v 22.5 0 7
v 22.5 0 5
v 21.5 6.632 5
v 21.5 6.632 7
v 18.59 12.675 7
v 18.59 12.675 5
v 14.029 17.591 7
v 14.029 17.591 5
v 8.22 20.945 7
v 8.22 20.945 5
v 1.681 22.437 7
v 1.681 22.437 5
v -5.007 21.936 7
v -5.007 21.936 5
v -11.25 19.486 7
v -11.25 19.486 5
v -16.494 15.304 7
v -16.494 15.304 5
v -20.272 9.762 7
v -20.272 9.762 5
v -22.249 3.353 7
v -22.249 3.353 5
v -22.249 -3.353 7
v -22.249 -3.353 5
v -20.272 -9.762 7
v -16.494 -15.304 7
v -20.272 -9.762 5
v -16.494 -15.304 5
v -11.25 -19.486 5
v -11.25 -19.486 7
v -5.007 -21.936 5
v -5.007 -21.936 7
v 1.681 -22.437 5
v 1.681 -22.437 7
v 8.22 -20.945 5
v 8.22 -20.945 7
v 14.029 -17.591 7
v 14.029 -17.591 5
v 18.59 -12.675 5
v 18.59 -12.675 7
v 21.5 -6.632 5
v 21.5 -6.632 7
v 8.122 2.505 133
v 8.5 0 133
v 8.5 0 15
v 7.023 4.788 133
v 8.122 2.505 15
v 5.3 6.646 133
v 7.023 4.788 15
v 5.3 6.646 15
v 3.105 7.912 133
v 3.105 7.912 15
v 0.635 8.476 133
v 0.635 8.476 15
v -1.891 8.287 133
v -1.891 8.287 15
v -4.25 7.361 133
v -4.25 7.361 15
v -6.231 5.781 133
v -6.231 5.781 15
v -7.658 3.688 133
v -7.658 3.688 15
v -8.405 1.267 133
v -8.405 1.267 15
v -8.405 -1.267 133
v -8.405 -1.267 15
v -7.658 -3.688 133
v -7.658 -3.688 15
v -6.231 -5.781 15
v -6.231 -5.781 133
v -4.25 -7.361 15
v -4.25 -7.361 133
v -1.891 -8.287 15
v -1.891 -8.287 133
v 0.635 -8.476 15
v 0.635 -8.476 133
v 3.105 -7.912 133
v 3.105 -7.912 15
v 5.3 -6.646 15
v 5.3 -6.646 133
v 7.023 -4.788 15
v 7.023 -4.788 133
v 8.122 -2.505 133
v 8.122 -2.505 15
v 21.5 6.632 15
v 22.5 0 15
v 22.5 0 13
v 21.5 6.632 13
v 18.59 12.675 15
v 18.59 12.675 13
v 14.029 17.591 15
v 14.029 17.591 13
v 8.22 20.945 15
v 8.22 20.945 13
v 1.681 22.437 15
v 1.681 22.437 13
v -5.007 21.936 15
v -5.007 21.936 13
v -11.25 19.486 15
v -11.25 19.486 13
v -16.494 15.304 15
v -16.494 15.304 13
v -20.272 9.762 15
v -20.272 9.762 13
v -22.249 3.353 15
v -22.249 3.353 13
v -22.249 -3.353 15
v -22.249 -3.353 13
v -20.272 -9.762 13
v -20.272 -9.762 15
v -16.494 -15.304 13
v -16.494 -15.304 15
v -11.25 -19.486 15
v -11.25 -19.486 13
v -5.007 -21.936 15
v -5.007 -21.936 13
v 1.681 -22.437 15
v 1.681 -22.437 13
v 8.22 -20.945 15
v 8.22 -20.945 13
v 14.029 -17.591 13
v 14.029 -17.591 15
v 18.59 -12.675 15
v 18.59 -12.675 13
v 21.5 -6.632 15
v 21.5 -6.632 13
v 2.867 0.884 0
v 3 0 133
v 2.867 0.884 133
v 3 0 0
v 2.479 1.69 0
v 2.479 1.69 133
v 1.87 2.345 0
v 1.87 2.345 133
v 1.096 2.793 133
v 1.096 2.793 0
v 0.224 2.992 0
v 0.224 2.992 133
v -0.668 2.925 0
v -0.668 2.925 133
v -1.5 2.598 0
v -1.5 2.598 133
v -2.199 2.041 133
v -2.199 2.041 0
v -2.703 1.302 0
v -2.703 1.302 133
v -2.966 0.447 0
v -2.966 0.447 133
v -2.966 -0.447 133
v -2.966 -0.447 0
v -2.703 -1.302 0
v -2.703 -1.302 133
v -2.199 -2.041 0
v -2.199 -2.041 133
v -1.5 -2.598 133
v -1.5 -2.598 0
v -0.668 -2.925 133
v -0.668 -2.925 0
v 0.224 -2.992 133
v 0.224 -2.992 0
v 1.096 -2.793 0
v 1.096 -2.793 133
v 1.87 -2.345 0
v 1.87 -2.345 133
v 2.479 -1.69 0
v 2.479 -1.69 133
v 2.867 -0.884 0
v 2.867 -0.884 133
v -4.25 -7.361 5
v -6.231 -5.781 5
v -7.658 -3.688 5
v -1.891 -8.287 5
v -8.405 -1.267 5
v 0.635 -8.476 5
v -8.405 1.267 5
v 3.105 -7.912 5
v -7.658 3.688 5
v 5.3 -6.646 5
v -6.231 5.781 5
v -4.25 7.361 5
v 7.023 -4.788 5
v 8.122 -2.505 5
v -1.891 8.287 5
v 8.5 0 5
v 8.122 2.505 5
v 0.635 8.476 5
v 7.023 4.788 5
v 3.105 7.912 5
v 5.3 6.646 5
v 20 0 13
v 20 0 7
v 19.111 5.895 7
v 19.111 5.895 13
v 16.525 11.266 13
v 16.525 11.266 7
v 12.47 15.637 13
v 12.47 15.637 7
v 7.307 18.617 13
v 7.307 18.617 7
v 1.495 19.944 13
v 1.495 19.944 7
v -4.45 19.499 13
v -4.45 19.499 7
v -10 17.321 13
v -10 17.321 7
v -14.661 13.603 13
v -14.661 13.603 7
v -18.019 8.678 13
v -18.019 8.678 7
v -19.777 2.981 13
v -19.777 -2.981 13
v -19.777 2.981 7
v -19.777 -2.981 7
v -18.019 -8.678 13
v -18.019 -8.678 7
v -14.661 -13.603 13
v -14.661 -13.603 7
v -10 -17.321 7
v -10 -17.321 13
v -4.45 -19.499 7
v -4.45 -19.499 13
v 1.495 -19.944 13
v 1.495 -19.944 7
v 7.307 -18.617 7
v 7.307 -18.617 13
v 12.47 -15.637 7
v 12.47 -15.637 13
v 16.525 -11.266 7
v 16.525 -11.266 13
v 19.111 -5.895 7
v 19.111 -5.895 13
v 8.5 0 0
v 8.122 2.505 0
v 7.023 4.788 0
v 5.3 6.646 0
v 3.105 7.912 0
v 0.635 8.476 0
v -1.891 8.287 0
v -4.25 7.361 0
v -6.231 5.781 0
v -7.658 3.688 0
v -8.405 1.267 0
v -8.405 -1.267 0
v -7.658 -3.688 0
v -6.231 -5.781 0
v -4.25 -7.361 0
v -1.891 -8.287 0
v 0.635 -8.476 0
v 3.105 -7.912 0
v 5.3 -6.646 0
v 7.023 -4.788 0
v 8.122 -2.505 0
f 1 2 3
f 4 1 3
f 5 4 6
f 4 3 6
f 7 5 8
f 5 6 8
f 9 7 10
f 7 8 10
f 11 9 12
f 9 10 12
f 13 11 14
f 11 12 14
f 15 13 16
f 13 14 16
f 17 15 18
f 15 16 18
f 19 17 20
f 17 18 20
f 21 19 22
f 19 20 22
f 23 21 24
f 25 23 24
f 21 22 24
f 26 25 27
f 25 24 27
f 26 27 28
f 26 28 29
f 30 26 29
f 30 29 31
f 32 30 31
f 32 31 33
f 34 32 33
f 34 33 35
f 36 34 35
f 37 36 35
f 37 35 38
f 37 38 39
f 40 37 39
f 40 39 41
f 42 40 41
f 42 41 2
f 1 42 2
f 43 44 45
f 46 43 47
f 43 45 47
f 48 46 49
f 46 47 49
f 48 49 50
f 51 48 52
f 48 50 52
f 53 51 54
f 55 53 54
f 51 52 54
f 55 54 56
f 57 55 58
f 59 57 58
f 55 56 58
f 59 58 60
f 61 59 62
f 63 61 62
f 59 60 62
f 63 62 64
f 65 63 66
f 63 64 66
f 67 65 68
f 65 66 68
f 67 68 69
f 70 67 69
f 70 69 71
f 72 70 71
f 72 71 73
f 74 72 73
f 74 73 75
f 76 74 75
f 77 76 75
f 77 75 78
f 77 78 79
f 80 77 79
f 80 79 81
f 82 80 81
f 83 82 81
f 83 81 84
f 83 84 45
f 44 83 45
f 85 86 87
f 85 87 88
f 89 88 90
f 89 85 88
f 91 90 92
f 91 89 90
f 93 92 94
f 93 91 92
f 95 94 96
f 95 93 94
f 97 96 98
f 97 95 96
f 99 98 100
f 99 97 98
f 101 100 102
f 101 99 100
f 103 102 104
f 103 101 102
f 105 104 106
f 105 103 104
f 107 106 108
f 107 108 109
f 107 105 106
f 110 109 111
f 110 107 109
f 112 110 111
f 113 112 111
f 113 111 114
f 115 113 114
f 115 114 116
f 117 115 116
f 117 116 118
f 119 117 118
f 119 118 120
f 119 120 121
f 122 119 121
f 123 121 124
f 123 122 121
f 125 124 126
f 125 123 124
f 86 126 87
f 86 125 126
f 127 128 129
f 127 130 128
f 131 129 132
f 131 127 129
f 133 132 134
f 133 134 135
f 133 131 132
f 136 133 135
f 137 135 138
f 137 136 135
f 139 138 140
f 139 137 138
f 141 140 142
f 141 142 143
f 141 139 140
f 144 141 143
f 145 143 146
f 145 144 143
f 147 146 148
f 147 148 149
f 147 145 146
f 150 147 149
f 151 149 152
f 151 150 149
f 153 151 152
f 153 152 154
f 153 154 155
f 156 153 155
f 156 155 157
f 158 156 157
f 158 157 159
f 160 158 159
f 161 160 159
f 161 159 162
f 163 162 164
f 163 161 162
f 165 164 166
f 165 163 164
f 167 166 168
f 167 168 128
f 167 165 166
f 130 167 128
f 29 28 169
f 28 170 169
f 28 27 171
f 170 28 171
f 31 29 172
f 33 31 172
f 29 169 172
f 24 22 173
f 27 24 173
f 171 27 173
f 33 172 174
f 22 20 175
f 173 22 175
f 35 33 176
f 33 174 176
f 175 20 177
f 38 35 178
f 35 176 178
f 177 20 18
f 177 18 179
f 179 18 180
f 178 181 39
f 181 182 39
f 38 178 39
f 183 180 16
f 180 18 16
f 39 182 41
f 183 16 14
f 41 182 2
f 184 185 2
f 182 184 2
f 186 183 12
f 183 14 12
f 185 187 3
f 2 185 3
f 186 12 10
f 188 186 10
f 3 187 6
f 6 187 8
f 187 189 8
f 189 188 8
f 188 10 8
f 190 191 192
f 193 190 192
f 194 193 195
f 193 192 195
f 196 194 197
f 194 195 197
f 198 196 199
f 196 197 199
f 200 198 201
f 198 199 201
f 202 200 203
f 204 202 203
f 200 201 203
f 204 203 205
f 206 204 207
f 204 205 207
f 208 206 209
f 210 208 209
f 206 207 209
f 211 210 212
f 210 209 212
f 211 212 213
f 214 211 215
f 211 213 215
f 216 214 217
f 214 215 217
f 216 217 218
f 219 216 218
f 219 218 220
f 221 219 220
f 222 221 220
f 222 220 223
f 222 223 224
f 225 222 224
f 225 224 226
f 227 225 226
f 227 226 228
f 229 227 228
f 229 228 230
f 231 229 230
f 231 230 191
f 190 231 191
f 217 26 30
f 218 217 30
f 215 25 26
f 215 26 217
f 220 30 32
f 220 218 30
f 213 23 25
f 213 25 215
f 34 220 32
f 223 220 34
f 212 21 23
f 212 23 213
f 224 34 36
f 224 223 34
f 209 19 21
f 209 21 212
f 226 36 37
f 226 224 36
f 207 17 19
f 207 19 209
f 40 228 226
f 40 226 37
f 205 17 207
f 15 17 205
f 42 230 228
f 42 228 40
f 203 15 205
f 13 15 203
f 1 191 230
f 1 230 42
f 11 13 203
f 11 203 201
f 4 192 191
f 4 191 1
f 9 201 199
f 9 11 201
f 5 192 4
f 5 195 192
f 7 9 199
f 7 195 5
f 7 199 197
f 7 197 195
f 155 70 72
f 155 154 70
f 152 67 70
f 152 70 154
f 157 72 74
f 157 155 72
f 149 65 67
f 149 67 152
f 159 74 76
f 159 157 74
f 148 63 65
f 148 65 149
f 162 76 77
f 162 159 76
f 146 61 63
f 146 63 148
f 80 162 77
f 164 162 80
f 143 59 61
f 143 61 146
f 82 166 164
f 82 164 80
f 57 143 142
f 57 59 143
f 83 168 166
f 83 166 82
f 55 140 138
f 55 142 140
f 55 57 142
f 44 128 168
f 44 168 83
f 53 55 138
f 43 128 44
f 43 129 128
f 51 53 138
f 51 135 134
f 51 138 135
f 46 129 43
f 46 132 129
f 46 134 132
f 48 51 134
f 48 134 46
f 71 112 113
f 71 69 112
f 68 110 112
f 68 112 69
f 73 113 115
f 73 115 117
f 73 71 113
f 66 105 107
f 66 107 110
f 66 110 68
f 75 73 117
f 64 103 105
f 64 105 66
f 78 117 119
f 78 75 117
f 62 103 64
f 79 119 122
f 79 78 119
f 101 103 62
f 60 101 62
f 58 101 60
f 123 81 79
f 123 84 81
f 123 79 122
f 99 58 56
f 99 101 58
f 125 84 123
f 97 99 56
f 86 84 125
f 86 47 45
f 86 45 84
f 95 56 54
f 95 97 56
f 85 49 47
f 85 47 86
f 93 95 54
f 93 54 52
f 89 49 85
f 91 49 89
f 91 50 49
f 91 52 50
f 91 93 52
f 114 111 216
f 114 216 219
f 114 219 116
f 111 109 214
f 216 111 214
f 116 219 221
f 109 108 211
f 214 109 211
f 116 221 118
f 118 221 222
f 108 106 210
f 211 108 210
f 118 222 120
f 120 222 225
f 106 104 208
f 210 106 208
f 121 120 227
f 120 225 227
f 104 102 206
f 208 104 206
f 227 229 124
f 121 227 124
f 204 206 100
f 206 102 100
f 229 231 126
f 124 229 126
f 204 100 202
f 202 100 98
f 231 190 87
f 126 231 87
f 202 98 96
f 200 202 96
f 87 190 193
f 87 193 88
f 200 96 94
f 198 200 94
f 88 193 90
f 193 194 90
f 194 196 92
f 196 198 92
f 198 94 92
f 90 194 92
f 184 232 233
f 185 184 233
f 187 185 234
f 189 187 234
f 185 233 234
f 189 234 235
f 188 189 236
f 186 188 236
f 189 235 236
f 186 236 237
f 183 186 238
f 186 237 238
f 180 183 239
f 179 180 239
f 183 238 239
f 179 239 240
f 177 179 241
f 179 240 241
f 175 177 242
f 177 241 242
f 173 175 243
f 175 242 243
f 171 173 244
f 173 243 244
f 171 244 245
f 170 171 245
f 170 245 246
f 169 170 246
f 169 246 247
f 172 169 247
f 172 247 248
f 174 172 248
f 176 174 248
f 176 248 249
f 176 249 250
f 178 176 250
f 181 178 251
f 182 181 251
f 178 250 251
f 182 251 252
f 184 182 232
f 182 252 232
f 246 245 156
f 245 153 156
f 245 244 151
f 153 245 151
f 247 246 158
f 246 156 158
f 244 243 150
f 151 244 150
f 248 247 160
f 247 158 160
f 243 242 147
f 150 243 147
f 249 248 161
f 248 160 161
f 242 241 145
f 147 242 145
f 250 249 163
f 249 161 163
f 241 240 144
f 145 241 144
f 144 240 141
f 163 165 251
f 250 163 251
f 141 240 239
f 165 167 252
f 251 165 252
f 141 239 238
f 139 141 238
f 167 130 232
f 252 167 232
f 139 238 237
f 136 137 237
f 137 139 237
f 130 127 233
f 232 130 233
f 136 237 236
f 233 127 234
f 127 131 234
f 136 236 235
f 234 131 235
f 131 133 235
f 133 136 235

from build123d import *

# Parameters (mm, degrees)
F0_R     = 8.5
F0_R_2   = 3
F1_DEPTH = 133
F0_R_3   = 20
F2_DEPTH = 15
F3_R     = 22.5
F4_DEPTH = 7
F3_R_2   = 20
F5_DEPTH = 5
F6_R     = 22.5
F6_R_2   = 20
F7_DEPTH = 2
F8_R     = 3
F9_DEPTH = 140


with BuildPart() as f1:
    # F0 (on Top) → F1 (new body)
    with BuildSketch(Plane.XY):
        Circle(F0_R)
        Circle(F0_R_2, mode=Mode.SUBTRACT)
    extrude(amount=F1_DEPTH)

    # F0 (on Top) → F2 (join)
    with BuildSketch(Plane.XY):
        Circle(F0_R_3)
        Circle(F0_R, mode=Mode.SUBTRACT)
    extrude(amount=F2_DEPTH)

    # F3 (on face) → F4 (join)
    with BuildSketch(Plane.XY):
        Circle(F3_R)
    extrude(amount=F4_DEPTH)

    # F3 (on face) + F0 (on Top) → F5 (cut)
    with BuildSketch(Plane.XY):
        Circle(F3_R)
        Circle(F3_R_2, mode=Mode.SUBTRACT)
    with BuildSketch(Plane.XY):
        Circle(F0_R_3)
        Circle(F0_R, mode=Mode.SUBTRACT)
    extrude(amount=F5_DEPTH, mode=Mode.SUBTRACT)

    # F6 (on face) → F7 (join)
    with BuildSketch(Plane.XY.offset(15)):
        Circle(F6_R)
        Circle(F6_R_2, mode=Mode.SUBTRACT)
    extrude(amount=-F7_DEPTH)

    # F8 (on face) → F9 (cut)
    with BuildSketch(Plane.XY):
        Circle(F8_R)
    extrude(amount=F9_DEPTH, mode=Mode.SUBTRACT)


solid = f1.part
